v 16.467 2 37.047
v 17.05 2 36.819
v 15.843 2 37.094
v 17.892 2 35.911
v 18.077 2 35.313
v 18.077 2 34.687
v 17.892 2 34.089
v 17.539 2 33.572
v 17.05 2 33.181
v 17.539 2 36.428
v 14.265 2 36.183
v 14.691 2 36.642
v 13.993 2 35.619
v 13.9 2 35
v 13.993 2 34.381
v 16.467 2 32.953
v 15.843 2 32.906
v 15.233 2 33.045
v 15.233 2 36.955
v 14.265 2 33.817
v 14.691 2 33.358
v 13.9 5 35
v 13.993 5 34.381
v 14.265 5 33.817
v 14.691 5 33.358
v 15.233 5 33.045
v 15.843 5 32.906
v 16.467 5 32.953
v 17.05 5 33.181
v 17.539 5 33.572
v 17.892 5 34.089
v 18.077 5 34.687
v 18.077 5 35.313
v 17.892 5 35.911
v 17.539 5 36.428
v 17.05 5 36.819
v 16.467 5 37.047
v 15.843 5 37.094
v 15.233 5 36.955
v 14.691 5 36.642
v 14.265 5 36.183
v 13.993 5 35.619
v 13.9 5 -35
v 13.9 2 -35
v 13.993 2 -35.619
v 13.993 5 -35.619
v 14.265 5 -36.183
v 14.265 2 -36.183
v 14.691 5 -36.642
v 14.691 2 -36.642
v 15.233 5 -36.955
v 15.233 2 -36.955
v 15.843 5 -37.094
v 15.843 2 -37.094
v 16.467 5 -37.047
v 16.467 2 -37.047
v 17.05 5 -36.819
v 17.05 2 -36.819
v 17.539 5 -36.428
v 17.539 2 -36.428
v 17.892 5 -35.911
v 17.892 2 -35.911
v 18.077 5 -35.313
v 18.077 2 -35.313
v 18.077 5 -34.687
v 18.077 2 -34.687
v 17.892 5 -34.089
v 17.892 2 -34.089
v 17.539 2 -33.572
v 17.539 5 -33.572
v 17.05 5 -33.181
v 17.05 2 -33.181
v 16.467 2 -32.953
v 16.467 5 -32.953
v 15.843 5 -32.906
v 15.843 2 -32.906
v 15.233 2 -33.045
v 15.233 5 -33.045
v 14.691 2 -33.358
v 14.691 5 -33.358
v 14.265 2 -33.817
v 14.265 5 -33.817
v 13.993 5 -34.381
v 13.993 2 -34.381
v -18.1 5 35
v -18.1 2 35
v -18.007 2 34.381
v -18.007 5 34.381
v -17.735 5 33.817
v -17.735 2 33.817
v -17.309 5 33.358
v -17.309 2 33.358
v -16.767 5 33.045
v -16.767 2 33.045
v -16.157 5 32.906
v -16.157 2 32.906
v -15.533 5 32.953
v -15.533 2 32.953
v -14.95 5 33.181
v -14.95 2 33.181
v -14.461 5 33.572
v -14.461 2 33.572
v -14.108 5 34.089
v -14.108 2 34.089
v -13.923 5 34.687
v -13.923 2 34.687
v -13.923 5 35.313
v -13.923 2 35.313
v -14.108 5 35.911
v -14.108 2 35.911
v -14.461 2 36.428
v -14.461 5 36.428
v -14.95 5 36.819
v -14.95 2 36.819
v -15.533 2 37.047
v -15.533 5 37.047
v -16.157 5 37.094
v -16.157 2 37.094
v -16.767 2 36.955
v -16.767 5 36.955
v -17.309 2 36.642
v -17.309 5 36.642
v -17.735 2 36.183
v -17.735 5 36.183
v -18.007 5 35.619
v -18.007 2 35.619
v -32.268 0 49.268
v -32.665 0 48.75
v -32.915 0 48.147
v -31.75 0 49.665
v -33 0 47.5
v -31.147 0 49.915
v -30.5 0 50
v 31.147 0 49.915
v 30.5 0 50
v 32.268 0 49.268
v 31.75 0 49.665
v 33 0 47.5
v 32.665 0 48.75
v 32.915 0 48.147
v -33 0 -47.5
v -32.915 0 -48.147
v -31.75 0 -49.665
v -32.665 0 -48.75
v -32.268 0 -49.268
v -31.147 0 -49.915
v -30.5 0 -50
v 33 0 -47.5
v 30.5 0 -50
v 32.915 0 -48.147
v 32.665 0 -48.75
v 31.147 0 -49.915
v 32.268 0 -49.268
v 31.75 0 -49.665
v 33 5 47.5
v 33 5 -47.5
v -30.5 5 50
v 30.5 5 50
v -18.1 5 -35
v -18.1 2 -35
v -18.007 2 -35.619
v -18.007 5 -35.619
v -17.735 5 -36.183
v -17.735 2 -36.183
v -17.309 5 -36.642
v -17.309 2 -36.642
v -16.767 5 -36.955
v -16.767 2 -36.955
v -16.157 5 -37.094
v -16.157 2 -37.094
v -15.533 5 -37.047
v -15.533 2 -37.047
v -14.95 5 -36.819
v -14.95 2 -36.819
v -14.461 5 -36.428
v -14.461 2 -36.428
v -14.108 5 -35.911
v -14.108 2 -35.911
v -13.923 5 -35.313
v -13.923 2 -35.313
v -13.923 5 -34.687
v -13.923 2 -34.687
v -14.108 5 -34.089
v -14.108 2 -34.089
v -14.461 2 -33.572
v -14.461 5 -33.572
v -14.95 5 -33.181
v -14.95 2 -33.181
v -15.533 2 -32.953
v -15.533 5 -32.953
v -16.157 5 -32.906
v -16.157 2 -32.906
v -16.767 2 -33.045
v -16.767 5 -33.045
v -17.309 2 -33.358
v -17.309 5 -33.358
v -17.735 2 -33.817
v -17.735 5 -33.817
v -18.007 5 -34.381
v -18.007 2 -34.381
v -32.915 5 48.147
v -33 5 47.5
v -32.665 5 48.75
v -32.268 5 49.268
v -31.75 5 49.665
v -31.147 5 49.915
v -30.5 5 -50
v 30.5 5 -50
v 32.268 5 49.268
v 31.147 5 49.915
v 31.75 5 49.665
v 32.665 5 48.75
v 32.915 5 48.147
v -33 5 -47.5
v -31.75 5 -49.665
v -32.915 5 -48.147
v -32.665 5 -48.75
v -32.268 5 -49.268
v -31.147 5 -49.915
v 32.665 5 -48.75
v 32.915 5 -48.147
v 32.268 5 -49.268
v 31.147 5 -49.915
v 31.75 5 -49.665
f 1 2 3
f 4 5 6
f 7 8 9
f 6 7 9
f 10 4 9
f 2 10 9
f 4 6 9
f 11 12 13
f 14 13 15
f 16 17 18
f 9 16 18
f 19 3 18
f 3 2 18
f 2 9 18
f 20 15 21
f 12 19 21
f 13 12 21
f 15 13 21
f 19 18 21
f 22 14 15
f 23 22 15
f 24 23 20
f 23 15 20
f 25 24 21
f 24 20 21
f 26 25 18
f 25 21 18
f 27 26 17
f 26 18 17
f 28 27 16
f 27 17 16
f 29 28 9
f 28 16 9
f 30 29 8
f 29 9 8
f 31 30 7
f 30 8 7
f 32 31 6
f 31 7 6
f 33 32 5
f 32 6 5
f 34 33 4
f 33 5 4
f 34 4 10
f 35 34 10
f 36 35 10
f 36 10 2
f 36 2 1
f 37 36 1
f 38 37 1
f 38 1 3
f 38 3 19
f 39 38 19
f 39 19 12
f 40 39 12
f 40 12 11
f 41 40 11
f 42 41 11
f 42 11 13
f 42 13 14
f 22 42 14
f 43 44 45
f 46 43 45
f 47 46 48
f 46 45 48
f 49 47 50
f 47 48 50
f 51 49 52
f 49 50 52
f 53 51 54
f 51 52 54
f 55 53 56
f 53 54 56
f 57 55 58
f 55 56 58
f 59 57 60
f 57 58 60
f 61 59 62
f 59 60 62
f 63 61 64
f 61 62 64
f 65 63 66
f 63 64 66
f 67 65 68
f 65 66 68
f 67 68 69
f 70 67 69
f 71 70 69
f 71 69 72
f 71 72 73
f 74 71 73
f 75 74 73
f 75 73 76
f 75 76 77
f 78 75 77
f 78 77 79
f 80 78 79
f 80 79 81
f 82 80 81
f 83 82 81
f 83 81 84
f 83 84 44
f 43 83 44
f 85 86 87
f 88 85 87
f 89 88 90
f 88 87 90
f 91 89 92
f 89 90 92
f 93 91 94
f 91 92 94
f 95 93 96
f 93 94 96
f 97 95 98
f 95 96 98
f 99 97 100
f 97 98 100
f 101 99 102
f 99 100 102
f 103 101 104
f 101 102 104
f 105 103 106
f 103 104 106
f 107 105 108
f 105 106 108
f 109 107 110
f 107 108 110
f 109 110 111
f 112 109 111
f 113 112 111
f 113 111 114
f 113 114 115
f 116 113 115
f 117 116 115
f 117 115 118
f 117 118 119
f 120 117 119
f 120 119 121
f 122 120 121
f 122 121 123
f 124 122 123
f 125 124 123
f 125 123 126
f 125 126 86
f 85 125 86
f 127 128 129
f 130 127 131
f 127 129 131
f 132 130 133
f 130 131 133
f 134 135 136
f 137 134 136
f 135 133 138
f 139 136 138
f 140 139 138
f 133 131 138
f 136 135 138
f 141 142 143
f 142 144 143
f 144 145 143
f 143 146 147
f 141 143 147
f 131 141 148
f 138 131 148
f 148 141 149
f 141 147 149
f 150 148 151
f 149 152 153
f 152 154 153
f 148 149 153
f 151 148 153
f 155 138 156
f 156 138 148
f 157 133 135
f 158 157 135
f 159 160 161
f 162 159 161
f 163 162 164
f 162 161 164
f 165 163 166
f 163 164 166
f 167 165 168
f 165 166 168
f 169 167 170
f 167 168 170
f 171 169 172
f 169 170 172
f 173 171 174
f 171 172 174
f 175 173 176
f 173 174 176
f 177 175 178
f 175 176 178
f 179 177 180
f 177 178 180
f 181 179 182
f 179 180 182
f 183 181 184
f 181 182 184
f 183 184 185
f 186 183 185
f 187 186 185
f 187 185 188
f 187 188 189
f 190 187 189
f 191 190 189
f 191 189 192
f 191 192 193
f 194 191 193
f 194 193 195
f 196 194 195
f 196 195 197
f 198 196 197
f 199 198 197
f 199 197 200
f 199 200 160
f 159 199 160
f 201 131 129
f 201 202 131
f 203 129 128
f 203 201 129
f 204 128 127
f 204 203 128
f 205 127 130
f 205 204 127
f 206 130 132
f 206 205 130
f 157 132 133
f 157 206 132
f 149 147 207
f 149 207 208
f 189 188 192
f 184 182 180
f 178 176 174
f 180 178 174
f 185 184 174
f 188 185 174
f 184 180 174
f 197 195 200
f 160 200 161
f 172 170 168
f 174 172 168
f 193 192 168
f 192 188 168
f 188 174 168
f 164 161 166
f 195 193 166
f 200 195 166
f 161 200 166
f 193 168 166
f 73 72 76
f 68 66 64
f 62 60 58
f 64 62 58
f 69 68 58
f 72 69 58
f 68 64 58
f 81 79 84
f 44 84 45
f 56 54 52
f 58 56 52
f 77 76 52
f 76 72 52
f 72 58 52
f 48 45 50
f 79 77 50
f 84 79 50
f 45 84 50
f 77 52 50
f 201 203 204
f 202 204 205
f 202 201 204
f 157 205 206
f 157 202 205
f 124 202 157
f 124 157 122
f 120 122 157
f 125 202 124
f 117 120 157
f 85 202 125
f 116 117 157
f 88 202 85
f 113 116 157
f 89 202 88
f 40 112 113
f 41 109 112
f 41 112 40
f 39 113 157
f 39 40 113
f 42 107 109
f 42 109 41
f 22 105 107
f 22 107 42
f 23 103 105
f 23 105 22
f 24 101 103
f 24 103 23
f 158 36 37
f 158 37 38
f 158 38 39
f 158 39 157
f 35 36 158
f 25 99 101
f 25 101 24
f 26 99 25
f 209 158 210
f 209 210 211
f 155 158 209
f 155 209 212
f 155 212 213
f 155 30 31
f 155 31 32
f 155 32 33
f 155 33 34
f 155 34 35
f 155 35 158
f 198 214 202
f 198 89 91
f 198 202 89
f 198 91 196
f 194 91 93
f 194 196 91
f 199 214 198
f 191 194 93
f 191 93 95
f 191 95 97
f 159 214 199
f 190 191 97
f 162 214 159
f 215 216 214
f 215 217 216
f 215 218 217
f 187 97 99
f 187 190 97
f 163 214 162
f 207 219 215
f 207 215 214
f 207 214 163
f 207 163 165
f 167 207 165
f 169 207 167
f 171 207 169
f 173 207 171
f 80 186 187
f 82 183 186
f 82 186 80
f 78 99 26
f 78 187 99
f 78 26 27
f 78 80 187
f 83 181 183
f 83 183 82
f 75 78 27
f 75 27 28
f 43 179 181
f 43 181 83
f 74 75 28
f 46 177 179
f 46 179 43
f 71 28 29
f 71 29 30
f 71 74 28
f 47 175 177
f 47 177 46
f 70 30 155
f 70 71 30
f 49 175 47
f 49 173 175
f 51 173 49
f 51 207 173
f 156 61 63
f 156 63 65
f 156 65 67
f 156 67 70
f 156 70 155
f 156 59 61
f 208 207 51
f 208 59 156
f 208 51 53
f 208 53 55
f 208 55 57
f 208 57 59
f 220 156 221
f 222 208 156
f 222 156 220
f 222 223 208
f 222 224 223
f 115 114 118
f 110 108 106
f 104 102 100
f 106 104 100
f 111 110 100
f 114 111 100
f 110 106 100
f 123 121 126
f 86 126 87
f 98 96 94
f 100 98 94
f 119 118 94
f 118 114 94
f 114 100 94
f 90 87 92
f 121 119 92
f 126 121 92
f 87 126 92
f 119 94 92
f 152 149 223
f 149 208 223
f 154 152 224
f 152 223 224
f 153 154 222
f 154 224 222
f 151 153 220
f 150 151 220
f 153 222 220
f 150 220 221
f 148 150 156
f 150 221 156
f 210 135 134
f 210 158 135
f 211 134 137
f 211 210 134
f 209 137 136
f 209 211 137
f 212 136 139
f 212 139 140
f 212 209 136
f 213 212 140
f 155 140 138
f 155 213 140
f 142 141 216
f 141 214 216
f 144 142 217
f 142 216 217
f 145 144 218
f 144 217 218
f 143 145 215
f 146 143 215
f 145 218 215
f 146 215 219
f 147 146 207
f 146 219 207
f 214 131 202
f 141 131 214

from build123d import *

# Parameters (mm, degrees)
SKETCH1_W                 = 66
SKETCH1_H                 = 100
BOSS_EXTRUDE1_DEPTH       = 5
F_4_0MM_DOWEL_HOLE1_D     = 4.2
F_4_0MM_DOWEL_HOLE1_DEPTH = 3
FILLET1_R                 = 2.5


with BuildPart() as part:
    # Sketch1 → Boss-Extrude1 (new body)
    with BuildSketch(Plane(origin=(0, 0, 0), x_dir=(1, 0, 0), z_dir=(0, 1, 0))):
        Rectangle(SKETCH1_W, SKETCH1_H)
    extrude(amount=BOSS_EXTRUDE1_DEPTH)

    # Ø4.0mm Dowel Hole1
    with Locations(Plane(origin=(0, 5, 0), x_dir=(1, 0, 0), z_dir=(0, 1, 0))):
        with Locations((-16, 35), (16, 35), (16, -35), (-16, -35)):
            Hole(F_4_0MM_DOWEL_HOLE1_D / 2, depth=F_4_0MM_DOWEL_HOLE1_DEPTH)

    # Fillet1
    fillet1_edges = [part.edges().sort_by_distance(p)[0] for p in [
        (-33, 2.5, -50),
        (33, 2.5, -50),
        (33, 2.5, 50),
        (-33, 2.5, 50),
    ]]
    fillet(fillet1_edges, radius=FILLET1_R)


solid = part.part
